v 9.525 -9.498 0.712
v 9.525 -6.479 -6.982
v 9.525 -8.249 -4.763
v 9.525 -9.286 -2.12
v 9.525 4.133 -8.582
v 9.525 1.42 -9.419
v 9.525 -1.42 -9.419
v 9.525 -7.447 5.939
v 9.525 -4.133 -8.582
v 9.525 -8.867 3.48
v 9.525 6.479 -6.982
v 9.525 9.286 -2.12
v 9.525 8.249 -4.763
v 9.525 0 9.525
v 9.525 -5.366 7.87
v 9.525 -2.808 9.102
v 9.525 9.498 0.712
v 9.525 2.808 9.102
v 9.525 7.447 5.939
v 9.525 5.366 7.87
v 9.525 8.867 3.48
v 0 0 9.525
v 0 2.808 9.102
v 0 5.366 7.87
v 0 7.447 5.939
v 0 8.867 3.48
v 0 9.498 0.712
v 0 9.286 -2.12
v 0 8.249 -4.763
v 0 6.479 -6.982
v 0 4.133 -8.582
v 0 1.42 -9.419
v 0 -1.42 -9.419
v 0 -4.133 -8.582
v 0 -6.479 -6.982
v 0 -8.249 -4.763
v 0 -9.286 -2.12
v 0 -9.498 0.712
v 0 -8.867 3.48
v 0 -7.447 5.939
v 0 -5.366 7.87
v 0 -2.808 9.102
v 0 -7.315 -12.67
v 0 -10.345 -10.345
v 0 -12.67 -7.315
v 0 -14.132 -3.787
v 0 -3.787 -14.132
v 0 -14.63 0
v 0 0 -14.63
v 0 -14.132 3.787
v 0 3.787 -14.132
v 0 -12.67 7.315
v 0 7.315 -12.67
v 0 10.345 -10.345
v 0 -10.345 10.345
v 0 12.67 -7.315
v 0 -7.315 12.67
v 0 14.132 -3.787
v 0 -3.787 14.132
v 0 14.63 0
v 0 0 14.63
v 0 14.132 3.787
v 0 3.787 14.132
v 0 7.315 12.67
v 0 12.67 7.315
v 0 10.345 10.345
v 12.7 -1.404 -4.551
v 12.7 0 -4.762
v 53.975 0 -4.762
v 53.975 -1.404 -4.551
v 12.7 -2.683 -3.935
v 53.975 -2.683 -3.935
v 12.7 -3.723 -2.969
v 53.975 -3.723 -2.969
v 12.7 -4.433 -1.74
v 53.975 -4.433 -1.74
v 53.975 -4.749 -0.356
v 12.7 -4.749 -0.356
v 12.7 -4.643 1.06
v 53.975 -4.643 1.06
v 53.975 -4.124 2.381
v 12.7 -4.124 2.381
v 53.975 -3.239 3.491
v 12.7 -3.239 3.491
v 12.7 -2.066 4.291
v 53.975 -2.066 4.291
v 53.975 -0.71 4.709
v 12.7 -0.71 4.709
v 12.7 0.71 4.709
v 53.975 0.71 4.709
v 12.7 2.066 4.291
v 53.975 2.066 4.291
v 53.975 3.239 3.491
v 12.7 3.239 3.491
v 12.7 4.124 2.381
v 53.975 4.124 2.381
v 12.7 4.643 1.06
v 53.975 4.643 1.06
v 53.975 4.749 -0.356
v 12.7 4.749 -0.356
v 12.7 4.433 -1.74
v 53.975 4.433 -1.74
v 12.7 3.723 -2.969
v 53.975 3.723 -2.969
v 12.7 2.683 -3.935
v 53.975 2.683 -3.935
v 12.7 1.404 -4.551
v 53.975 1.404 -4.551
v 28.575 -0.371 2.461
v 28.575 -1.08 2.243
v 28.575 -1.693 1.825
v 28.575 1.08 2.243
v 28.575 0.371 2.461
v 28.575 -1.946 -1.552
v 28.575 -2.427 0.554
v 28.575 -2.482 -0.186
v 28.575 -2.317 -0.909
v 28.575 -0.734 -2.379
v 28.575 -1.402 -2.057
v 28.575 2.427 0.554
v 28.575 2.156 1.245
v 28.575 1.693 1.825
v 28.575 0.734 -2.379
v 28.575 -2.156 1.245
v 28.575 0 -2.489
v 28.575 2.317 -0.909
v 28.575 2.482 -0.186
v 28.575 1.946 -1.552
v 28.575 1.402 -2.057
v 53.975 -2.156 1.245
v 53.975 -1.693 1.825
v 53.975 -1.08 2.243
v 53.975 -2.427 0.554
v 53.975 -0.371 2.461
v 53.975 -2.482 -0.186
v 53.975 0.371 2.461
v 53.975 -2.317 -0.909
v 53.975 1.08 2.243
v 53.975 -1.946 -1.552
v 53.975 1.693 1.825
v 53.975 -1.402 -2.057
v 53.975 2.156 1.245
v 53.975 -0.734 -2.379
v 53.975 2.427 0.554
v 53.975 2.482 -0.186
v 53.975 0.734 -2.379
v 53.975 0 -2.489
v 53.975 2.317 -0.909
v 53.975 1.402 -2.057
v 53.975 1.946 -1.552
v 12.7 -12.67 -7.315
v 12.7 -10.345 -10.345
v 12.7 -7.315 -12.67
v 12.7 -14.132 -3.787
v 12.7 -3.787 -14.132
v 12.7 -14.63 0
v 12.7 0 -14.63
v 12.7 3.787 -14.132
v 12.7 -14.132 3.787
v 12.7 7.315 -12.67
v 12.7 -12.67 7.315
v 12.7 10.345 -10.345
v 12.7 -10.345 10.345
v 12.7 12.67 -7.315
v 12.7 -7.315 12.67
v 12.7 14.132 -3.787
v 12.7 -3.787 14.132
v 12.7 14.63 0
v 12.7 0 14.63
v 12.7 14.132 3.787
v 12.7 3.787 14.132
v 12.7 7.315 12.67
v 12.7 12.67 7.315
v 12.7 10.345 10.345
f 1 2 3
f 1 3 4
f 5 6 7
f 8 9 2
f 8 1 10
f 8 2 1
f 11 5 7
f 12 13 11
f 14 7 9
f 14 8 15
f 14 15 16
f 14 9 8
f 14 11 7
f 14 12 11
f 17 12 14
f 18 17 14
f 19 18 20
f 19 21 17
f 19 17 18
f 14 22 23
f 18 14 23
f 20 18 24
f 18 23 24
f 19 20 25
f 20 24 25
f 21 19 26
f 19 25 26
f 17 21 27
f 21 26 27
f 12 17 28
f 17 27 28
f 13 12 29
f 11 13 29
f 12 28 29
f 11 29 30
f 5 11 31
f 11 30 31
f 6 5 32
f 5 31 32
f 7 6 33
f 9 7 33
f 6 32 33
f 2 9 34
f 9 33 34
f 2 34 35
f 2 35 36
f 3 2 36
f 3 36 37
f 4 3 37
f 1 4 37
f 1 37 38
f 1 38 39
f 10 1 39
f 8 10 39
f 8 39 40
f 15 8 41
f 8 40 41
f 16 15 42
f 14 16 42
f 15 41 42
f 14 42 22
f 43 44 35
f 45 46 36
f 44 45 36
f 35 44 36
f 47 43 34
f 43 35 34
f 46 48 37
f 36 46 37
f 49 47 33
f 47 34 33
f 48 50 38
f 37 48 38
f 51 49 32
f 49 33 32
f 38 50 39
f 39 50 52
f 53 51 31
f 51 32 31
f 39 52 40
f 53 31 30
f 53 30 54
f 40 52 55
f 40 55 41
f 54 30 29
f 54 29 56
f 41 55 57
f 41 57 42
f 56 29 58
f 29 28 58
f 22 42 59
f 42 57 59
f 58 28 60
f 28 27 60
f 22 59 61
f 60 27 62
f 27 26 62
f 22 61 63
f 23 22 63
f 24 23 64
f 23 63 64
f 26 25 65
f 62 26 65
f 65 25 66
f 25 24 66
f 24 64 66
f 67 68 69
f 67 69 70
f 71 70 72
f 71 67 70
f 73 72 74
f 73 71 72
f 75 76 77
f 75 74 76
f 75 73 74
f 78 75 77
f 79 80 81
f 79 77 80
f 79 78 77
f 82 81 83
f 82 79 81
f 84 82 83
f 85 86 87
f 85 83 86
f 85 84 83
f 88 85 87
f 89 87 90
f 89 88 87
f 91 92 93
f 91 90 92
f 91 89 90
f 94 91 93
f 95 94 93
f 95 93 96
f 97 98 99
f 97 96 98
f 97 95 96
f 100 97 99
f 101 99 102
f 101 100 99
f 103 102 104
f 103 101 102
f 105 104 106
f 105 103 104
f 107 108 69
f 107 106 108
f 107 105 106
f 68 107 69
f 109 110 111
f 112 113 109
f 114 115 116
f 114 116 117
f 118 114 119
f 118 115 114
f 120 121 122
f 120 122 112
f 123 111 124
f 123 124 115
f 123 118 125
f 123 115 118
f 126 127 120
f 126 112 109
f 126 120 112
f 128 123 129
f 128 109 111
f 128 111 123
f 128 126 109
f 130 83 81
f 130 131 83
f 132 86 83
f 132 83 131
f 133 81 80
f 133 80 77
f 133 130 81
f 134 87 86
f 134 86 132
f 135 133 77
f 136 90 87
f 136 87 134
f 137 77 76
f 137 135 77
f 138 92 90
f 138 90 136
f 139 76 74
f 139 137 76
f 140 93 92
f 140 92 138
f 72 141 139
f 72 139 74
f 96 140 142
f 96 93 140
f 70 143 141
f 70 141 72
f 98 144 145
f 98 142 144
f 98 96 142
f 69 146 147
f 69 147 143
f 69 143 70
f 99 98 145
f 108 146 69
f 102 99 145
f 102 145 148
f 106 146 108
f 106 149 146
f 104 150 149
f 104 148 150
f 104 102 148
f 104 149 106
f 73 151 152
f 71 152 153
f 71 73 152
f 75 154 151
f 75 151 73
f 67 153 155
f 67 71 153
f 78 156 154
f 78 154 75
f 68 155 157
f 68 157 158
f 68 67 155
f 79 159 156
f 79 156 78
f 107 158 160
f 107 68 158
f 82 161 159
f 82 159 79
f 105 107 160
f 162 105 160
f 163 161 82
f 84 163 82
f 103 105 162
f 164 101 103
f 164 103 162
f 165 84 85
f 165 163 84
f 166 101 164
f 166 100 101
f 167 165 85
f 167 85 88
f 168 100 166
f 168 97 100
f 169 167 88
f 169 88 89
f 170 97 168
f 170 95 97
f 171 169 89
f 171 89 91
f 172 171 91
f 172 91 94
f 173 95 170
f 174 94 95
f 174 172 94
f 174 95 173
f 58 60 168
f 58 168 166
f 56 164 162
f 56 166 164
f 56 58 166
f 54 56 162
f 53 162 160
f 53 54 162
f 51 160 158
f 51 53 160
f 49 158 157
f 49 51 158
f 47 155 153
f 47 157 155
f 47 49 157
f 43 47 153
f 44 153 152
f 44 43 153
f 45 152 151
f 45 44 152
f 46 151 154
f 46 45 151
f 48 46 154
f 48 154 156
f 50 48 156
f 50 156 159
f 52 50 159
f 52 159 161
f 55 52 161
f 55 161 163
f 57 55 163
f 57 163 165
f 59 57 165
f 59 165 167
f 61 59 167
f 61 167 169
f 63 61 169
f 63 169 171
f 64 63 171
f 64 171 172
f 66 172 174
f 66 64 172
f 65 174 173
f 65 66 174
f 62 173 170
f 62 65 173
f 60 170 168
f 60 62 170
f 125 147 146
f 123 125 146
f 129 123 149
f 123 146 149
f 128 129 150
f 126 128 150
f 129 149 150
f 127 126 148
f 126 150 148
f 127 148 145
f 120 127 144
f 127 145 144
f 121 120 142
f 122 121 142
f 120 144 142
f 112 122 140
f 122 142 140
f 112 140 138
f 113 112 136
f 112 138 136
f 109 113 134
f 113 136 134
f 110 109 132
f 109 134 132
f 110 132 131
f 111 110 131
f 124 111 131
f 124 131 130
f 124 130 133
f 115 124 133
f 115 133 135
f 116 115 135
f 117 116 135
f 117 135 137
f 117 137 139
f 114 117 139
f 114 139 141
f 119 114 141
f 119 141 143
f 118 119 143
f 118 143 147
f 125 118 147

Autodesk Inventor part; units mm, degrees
ref_plane "YZ Plane" through (0, 0, 0) normal (1, 0, 0) x (0, 1, 0)
ref_plane "XZ Plane" through (0, 0, 0) normal (0, 1, 0) x (-1, 0, 0)
ref_plane "XY Plane" through (0, 0, 0) normal (0, 0, 1) x (1, 0, 0)
sketch "Sketch3" plane through (0, 0, 0) normal (1, 0, 0) x (0, 1, 0)
  circle A0 centre (0, 0) radius 15.875 construction
  circle A1 centre (0, 0) radius 14.6304
  dimension "d8" = 31.75
  dimension "d9" = 1.2446
extrude "Extrusion3" add sketch "Sketch3" along normal blind 12.7
sketch "Sketch4" plane through (12.7, 0, 0) normal (1, 0, 0) x (0, 0, -1)
  circle A0 centre (0, 0) radius 4.7625
  dimension "d12" = 9.525
extrude "Extrusion4" add sketch "Sketch4" along normal blind 41.275
sketch "Sketch5" plane through (53.975, 0, 0) normal (1, 0, 0) x (0, 0, -1)
  circle A0 centre (0, 0) radius 2.4892
  dimension "d15" = 4.9784
extrude "Extrusion5" cut sketch "Sketch5" against normal blind 25.4
sketch "Sketch6" plane through (0, 0, 0) normal (-1, 0, 0) x (0, 0, 1)
  circle A0 centre (0, 0) radius 9.525
  dimension "d18" = 19.05
extrude "Extrusion6" cut sketch "Sketch6" against normal blind 9.525
properties part number "Long roller plug 3"
